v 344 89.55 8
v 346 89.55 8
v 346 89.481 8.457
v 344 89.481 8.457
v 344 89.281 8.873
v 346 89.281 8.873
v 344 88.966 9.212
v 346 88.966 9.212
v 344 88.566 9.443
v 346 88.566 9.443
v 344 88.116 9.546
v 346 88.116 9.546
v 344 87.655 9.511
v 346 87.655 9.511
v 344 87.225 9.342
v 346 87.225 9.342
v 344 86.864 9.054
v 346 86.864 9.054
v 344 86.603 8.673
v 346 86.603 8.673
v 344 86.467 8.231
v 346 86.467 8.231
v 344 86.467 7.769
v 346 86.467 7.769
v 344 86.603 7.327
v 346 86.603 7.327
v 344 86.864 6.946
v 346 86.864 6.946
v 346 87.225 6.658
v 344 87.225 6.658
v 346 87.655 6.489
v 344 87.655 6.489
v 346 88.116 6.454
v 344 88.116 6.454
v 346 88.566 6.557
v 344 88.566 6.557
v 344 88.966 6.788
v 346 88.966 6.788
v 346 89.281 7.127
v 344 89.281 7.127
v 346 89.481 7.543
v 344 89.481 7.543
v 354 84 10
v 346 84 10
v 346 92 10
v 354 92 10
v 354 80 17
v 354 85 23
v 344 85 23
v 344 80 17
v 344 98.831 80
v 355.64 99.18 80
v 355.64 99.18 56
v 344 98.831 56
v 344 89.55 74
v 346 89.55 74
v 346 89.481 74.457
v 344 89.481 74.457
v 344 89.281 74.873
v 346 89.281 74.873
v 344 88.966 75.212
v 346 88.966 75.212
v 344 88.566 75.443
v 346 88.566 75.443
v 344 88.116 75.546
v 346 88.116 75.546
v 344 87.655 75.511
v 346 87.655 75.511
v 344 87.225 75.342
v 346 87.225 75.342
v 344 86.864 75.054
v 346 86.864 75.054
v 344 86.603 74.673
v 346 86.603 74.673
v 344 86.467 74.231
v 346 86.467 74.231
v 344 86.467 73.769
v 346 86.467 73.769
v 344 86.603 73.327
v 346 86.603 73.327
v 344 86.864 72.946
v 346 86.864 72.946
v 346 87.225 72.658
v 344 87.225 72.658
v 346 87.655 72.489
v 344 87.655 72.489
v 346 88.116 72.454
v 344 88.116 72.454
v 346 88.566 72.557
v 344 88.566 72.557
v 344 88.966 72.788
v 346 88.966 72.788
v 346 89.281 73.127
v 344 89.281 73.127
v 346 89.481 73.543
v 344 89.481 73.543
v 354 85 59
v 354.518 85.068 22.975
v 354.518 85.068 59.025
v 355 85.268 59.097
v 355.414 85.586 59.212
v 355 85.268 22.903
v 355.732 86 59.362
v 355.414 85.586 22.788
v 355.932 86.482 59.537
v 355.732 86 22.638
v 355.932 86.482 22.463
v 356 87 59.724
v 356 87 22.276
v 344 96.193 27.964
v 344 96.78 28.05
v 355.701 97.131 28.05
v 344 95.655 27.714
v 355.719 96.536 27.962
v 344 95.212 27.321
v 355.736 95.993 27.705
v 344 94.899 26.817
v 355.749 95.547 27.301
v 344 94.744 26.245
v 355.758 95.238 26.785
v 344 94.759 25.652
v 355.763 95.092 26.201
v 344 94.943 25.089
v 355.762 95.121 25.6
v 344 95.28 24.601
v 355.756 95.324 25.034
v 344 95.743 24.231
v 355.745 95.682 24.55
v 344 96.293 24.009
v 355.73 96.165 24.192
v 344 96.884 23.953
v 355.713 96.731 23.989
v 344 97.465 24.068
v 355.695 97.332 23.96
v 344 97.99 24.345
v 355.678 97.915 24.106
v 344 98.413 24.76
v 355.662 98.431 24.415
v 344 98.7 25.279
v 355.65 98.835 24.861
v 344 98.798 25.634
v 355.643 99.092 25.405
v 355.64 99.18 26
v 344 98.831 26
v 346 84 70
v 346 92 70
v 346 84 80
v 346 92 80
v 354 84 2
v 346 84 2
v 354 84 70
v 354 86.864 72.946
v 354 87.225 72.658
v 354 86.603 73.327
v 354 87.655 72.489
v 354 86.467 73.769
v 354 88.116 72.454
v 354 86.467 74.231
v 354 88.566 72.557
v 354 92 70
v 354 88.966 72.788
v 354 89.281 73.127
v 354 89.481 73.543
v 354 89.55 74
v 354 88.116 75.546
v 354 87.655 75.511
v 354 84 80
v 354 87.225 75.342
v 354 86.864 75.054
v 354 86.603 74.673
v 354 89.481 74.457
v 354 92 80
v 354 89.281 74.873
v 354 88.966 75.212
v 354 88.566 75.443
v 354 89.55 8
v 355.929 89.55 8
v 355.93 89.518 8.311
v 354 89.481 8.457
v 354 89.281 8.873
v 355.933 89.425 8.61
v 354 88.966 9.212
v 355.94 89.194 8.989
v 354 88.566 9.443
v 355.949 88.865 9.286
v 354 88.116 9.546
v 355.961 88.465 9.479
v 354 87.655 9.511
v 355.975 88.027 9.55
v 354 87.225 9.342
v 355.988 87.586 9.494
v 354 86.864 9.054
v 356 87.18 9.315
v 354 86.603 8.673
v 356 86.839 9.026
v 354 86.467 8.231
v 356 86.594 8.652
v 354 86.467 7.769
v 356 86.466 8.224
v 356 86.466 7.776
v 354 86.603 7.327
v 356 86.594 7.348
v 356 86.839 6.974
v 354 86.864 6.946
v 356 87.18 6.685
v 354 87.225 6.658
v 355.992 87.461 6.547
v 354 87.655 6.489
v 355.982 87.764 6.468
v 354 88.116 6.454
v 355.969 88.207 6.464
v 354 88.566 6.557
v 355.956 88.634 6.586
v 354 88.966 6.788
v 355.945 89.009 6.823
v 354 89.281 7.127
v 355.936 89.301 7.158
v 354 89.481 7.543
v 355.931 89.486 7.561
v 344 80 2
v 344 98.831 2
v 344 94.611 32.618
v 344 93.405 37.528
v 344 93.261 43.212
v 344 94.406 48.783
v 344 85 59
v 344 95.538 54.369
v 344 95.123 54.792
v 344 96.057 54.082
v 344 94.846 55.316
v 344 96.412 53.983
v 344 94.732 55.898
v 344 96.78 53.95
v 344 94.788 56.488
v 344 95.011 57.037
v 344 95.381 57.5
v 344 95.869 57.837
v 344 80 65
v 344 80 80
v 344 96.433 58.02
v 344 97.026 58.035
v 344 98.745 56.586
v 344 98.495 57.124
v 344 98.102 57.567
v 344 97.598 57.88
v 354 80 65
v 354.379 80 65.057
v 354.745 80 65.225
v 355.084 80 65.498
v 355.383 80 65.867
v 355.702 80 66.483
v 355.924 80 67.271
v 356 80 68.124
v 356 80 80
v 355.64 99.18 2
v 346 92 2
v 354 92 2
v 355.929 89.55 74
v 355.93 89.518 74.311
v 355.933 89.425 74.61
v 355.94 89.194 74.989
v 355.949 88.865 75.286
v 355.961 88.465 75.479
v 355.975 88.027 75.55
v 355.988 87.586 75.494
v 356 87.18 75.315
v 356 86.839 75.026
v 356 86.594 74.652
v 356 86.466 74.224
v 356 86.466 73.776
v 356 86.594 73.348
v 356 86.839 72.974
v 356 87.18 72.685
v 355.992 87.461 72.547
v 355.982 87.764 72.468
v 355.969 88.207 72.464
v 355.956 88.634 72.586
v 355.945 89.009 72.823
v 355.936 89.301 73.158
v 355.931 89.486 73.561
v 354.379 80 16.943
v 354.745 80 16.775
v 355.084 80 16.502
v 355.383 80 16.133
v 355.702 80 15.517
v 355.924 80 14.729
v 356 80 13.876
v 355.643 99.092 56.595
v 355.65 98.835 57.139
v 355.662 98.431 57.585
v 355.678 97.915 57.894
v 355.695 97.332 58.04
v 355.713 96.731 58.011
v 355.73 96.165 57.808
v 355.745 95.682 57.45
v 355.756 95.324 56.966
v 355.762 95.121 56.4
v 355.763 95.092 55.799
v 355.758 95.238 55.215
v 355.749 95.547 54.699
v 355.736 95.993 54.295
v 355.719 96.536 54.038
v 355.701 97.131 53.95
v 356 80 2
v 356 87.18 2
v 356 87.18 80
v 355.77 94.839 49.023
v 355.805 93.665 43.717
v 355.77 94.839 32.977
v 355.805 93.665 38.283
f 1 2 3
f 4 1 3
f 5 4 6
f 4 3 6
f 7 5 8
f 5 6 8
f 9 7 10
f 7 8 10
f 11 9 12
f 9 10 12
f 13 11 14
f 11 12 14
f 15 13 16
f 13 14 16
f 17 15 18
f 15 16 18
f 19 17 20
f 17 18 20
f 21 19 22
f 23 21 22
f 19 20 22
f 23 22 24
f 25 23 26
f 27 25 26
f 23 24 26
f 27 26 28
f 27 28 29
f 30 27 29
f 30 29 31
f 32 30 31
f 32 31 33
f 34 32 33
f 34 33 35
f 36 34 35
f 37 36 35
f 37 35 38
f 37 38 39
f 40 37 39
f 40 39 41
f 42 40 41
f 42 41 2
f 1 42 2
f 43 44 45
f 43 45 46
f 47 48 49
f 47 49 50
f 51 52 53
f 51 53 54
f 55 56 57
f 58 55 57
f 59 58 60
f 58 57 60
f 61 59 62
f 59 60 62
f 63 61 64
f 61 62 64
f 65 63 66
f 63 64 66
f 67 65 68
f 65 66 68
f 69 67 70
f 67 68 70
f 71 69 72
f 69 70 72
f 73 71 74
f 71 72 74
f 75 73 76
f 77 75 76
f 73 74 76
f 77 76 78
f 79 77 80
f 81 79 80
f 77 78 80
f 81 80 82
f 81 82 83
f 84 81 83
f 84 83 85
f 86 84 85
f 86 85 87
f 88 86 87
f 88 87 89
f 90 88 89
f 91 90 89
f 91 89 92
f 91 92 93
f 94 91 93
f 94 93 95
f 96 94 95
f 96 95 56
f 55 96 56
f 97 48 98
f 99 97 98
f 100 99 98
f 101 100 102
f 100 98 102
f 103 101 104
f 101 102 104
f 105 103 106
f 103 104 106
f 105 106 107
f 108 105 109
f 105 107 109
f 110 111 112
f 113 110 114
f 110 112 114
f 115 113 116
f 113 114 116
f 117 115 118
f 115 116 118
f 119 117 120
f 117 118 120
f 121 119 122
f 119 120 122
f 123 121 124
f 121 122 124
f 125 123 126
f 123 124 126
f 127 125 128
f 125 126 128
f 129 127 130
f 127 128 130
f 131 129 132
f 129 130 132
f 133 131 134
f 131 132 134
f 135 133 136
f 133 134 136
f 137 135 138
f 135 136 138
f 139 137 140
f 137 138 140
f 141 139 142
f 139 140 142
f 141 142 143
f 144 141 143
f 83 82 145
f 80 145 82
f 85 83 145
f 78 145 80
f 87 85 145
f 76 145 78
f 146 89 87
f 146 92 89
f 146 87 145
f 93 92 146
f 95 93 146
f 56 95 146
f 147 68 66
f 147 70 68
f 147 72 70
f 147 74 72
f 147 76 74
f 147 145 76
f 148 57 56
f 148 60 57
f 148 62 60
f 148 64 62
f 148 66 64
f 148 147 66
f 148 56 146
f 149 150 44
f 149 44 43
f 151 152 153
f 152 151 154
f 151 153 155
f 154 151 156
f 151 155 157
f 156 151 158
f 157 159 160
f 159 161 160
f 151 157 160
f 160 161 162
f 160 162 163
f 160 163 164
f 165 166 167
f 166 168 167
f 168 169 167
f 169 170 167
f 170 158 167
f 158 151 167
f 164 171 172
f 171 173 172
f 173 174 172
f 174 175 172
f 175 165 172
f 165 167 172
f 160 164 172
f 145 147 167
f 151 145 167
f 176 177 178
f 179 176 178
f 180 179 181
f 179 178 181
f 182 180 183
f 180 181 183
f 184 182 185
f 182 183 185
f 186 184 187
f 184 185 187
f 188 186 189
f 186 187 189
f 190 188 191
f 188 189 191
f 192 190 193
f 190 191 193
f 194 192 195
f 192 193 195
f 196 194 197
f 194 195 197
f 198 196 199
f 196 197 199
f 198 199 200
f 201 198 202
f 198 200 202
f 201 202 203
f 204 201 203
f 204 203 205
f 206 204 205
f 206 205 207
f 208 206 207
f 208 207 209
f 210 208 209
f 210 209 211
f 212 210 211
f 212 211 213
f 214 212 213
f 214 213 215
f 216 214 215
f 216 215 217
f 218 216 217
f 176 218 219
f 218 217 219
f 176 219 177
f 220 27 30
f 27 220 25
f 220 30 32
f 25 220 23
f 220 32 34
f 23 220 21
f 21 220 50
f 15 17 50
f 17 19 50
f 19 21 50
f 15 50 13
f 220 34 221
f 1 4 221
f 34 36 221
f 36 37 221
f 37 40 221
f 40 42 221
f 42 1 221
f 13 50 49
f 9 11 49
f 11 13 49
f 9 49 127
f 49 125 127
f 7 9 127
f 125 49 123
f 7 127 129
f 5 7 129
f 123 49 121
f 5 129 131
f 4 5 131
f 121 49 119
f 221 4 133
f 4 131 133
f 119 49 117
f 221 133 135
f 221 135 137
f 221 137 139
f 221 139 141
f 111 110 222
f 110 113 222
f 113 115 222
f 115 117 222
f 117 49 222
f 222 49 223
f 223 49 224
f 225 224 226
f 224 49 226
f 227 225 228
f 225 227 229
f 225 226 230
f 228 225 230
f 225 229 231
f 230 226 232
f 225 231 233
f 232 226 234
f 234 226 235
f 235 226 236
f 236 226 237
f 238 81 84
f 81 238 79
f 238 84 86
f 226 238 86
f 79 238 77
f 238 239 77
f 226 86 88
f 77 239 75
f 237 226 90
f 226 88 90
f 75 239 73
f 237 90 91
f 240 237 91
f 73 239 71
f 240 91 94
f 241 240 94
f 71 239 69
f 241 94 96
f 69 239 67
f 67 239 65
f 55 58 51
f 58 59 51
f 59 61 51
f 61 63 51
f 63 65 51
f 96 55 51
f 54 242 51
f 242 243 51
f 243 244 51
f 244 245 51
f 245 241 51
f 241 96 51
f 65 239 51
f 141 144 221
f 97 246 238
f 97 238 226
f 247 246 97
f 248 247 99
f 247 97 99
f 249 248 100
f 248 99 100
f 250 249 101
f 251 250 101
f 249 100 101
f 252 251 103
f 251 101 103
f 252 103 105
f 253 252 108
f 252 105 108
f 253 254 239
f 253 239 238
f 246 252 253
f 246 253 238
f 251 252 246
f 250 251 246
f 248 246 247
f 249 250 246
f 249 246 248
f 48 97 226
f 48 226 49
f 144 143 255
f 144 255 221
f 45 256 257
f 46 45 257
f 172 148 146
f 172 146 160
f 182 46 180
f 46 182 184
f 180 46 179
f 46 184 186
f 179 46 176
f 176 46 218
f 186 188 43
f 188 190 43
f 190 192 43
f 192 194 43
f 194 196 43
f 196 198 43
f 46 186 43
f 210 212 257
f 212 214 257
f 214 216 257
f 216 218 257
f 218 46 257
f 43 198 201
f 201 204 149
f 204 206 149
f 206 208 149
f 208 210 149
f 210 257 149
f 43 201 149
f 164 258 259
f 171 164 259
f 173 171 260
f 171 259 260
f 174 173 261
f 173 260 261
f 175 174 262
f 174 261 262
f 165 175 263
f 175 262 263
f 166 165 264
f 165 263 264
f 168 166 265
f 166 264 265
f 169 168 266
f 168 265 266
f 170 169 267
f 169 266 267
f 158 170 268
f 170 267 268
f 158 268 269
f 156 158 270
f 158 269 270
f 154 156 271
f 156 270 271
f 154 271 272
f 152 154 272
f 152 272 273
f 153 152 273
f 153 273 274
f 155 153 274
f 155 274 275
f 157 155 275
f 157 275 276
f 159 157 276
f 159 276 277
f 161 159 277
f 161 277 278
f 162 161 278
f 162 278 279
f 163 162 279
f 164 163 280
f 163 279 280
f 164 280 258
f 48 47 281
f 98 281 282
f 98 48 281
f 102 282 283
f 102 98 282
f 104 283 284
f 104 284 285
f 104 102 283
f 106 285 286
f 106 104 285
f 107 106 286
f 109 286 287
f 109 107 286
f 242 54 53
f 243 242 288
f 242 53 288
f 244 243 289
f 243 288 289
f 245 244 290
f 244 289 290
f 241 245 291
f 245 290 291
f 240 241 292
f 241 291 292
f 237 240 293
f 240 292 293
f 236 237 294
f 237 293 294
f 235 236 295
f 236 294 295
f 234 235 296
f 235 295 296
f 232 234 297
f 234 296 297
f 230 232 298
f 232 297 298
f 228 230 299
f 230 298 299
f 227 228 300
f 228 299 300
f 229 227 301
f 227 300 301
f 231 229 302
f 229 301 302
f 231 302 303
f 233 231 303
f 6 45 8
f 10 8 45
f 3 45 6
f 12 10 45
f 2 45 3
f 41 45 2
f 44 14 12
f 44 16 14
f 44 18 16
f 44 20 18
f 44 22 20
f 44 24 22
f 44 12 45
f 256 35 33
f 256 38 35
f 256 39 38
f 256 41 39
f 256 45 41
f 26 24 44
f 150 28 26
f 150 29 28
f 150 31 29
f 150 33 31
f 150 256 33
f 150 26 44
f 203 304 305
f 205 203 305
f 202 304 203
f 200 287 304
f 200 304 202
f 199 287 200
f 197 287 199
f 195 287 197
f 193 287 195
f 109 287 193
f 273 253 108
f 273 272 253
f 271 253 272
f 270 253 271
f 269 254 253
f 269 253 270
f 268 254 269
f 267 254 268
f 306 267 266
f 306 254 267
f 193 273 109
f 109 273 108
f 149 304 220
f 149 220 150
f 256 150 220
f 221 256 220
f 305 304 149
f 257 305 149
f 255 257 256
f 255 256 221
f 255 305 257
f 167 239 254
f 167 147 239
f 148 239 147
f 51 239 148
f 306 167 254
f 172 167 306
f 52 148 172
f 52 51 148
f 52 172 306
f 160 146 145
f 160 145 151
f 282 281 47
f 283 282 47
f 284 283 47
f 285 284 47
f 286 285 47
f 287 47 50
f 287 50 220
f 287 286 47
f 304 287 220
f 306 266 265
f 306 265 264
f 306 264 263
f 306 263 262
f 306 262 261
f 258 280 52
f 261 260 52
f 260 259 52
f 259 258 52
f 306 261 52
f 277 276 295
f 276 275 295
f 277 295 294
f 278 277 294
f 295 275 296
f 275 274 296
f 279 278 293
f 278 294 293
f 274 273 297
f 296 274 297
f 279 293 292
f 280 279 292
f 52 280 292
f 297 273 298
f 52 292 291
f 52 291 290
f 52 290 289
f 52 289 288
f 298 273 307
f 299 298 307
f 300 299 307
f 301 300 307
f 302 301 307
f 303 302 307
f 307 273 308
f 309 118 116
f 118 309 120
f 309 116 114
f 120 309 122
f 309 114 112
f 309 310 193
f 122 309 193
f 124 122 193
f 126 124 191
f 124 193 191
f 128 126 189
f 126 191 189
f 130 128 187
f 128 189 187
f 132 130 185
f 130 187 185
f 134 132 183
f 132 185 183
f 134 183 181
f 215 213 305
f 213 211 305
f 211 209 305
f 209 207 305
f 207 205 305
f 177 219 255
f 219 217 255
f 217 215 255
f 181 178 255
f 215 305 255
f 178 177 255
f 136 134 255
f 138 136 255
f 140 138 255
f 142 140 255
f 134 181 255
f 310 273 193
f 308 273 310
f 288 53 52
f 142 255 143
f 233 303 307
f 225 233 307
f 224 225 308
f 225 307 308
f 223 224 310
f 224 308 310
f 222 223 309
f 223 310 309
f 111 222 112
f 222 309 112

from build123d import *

# Parameters (mm, degrees)
PAD_DEPTH       = 80
POCKET_DEPTH    = 78
POCKET001_DEPTH = 408.7079232475
POCKET002_DEPTH = 408.4326470939
SKETCH004_W     = 433.609177
SKETCH004_H     = 149.2376851805
SKETCH004_W_2   = 114.034424
SKETCH004_H_2   = 150.6867891805
POCKET003_DEPTH = 80.001
SKETCH005_W     = 8
SKETCH005_H     = 8
POCKET004_DEPTH = 10
SKETCH006_W     = 8
SKETCH006_H     = 8
POCKET005_DEPTH = 10
SKETCH007_R     = 1.55
POCKET006_DEPTH = 12.001
POCKET007_DEPTH = 12.001
FILLET_R        = 2
FILLET001_R     = 2


with BuildPart() as part:
    # Sketch → Pad (new body)
    with BuildSketch(Plane.XY):
        Polygon((450, 0), (450, 90), (356, 87.18), (355.64, 99.18), (343.64, 98.82), (344, 86.82), (6, 76.68), (5.64, 88.6800000001), (-6.36, 88.3200000001), (-6, 76.32), (-50, 75), (-50, 0), align=None)
    extrude(amount=PAD_DEPTH)

    # Sketch001 (on Face14 of Pad) → Pocket (cut)
    with BuildSketch(Plane.XY.offset(80)):
        Polygon((-50, 15), (-50, 74), (450, 74), (450, 0), (356, 2.82), (356.3, 12.82), (344.3, 13.18), (344, 3.18), (6, 13.32), (6.3, 23.32), (-5.7, 23.68), (-6, 13.68), align=None)
    extrude(amount=-POCKET_DEPTH, mode=Mode.SUBTRACT)

    # Sketch002 (on Face26 of Pocket) → Pocket001 (cut, through all)
    with BuildSketch(Plane(origin=(355.5953641722, -10.6678609252, 0), x_dir=(0.0299865091, 0.9995503035, 0), z_dir=(0.9995503035, -0.0299865091, 0))):
        with BuildLine():
            ThreePointArc((23.4984280855, 56), (19.9988591841, 57.4495689014), (21.4484280855, 53.95))
            ThreePointArc((21.4484280855, 53.95), (17.8329435114, 41), (21.4484280855, 28.05))
            ThreePointArc((21.4484280855, 28.05), (19.9988591841, 24.5504310986), (23.4984280855, 26))
            Line((23.4984280855, 26), (23.4984280855, 56))
        make_face()
    extrude(amount=-POCKET001_DEPTH, mode=Mode.SUBTRACT)

    # Sketch003 (on Face14 of Pocket001) → Pocket002 (cut, through all)
    with BuildSketch(Plane(origin=(358.2929363573, 10.7487880907, 0), x_dir=(-0.0299865091, 0.9995503035, 0), z_dir=(0.9995503035, 0.0299865091, 0))):
        with BuildLine():
            ThreePointArc((88.470997005, 56), (84.9714281036, 57.4495689014), (86.420997005, 53.95))
            ThreePointArc((86.420997005, 53.95), (82.8055124309, 41), (86.420997005, 28.05))
            ThreePointArc((86.420997005, 28.05), (84.9714281036, 24.5504310986), (88.470997005, 26))
            Line((88.470997005, 26), (88.470997005, 56))
        make_face()
    extrude(amount=-POCKET002_DEPTH, mode=Mode.SUBTRACT)

    # Sketch004 (on Face7 of Pocket002) → Pocket003 (cut, through all)
    with BuildSketch(Plane.XY.offset(80)):
        with Locations((127.1954115, 57.2464115903)):
            Rectangle(SKETCH004_W, SKETCH004_H)
        with Locations((413.017212, 56.5218595903)):
            Rectangle(SKETCH004_W_2, SKETCH004_H_2)
    extrude(amount=-POCKET003_DEPTH, mode=Mode.SUBTRACT)

    # Sketch005 (on Face8 of Pocket003) → Pocket004 (cut)
    with BuildSketch(Plane.XY.offset(80)):
        with Locations((350, 88)):
            Rectangle(SKETCH005_W, SKETCH005_H)
        with Locations((350, 6)):
            Rectangle(SKETCH005_W, SKETCH005_H)
    extrude(amount=-POCKET004_DEPTH, mode=Mode.SUBTRACT)

    # Sketch006 (on Face1 of Pocket004) → Pocket005 (cut)
    with BuildSketch(Plane(origin=(0, 0, 0), x_dir=(1, 0, 0), z_dir=(0, 0, -1))):
        with Locations((350, -6)):
            Rectangle(SKETCH006_W, SKETCH006_H)
        with Locations((350, -88)):
            Rectangle(SKETCH006_W, SKETCH006_H)
    extrude(amount=-POCKET005_DEPTH, mode=Mode.SUBTRACT)

    # Sketch007 (on Face6 of Pocket005) → Pocket006 (cut, through all)
    with BuildSketch(Plane.YZ.offset(356)):
        with Locations((6, 74)):
            Circle(SKETCH007_R)
        with Locations((88, 74)):
            Circle(SKETCH007_R)
        with Locations((88, 8)):
            Circle(SKETCH007_R)
        with Locations((6, 8)):
            Circle(SKETCH007_R)
    extrude(amount=-POCKET006_DEPTH, mode=Mode.SUBTRACT)

    # Sketch008 (on Face6 of Pocket006) → Pocket007 (cut, through all)
    with BuildSketch(Plane.YZ.offset(356)):
        Polygon((80, 2), (119.955566, 2), (119.955566, -12.384934), (-14.175961, -12.384934), (-14.175961, 94.92028), (80, 94.92028), (80, 65), (85, 59), (85, 23), (80, 17), align=None)
    extrude(amount=-POCKET007_DEPTH, mode=Mode.SUBTRACT)

    # Fillet
    fillet_edges = [part.edges().sort_by_distance(p)[0] for p in [
        (356, 85, 41),
    ]]
    fillet(fillet_edges, radius=FILLET_R)

    # Fillet001
    fillet001_edges = [part.edges().sort_by_distance(p)[0] for p in [
        (356, 82.5, 20),
        (356, 82.5, 62),
    ]]
    fillet(fillet001_edges, radius=FILLET001_R)


solid = part.part
